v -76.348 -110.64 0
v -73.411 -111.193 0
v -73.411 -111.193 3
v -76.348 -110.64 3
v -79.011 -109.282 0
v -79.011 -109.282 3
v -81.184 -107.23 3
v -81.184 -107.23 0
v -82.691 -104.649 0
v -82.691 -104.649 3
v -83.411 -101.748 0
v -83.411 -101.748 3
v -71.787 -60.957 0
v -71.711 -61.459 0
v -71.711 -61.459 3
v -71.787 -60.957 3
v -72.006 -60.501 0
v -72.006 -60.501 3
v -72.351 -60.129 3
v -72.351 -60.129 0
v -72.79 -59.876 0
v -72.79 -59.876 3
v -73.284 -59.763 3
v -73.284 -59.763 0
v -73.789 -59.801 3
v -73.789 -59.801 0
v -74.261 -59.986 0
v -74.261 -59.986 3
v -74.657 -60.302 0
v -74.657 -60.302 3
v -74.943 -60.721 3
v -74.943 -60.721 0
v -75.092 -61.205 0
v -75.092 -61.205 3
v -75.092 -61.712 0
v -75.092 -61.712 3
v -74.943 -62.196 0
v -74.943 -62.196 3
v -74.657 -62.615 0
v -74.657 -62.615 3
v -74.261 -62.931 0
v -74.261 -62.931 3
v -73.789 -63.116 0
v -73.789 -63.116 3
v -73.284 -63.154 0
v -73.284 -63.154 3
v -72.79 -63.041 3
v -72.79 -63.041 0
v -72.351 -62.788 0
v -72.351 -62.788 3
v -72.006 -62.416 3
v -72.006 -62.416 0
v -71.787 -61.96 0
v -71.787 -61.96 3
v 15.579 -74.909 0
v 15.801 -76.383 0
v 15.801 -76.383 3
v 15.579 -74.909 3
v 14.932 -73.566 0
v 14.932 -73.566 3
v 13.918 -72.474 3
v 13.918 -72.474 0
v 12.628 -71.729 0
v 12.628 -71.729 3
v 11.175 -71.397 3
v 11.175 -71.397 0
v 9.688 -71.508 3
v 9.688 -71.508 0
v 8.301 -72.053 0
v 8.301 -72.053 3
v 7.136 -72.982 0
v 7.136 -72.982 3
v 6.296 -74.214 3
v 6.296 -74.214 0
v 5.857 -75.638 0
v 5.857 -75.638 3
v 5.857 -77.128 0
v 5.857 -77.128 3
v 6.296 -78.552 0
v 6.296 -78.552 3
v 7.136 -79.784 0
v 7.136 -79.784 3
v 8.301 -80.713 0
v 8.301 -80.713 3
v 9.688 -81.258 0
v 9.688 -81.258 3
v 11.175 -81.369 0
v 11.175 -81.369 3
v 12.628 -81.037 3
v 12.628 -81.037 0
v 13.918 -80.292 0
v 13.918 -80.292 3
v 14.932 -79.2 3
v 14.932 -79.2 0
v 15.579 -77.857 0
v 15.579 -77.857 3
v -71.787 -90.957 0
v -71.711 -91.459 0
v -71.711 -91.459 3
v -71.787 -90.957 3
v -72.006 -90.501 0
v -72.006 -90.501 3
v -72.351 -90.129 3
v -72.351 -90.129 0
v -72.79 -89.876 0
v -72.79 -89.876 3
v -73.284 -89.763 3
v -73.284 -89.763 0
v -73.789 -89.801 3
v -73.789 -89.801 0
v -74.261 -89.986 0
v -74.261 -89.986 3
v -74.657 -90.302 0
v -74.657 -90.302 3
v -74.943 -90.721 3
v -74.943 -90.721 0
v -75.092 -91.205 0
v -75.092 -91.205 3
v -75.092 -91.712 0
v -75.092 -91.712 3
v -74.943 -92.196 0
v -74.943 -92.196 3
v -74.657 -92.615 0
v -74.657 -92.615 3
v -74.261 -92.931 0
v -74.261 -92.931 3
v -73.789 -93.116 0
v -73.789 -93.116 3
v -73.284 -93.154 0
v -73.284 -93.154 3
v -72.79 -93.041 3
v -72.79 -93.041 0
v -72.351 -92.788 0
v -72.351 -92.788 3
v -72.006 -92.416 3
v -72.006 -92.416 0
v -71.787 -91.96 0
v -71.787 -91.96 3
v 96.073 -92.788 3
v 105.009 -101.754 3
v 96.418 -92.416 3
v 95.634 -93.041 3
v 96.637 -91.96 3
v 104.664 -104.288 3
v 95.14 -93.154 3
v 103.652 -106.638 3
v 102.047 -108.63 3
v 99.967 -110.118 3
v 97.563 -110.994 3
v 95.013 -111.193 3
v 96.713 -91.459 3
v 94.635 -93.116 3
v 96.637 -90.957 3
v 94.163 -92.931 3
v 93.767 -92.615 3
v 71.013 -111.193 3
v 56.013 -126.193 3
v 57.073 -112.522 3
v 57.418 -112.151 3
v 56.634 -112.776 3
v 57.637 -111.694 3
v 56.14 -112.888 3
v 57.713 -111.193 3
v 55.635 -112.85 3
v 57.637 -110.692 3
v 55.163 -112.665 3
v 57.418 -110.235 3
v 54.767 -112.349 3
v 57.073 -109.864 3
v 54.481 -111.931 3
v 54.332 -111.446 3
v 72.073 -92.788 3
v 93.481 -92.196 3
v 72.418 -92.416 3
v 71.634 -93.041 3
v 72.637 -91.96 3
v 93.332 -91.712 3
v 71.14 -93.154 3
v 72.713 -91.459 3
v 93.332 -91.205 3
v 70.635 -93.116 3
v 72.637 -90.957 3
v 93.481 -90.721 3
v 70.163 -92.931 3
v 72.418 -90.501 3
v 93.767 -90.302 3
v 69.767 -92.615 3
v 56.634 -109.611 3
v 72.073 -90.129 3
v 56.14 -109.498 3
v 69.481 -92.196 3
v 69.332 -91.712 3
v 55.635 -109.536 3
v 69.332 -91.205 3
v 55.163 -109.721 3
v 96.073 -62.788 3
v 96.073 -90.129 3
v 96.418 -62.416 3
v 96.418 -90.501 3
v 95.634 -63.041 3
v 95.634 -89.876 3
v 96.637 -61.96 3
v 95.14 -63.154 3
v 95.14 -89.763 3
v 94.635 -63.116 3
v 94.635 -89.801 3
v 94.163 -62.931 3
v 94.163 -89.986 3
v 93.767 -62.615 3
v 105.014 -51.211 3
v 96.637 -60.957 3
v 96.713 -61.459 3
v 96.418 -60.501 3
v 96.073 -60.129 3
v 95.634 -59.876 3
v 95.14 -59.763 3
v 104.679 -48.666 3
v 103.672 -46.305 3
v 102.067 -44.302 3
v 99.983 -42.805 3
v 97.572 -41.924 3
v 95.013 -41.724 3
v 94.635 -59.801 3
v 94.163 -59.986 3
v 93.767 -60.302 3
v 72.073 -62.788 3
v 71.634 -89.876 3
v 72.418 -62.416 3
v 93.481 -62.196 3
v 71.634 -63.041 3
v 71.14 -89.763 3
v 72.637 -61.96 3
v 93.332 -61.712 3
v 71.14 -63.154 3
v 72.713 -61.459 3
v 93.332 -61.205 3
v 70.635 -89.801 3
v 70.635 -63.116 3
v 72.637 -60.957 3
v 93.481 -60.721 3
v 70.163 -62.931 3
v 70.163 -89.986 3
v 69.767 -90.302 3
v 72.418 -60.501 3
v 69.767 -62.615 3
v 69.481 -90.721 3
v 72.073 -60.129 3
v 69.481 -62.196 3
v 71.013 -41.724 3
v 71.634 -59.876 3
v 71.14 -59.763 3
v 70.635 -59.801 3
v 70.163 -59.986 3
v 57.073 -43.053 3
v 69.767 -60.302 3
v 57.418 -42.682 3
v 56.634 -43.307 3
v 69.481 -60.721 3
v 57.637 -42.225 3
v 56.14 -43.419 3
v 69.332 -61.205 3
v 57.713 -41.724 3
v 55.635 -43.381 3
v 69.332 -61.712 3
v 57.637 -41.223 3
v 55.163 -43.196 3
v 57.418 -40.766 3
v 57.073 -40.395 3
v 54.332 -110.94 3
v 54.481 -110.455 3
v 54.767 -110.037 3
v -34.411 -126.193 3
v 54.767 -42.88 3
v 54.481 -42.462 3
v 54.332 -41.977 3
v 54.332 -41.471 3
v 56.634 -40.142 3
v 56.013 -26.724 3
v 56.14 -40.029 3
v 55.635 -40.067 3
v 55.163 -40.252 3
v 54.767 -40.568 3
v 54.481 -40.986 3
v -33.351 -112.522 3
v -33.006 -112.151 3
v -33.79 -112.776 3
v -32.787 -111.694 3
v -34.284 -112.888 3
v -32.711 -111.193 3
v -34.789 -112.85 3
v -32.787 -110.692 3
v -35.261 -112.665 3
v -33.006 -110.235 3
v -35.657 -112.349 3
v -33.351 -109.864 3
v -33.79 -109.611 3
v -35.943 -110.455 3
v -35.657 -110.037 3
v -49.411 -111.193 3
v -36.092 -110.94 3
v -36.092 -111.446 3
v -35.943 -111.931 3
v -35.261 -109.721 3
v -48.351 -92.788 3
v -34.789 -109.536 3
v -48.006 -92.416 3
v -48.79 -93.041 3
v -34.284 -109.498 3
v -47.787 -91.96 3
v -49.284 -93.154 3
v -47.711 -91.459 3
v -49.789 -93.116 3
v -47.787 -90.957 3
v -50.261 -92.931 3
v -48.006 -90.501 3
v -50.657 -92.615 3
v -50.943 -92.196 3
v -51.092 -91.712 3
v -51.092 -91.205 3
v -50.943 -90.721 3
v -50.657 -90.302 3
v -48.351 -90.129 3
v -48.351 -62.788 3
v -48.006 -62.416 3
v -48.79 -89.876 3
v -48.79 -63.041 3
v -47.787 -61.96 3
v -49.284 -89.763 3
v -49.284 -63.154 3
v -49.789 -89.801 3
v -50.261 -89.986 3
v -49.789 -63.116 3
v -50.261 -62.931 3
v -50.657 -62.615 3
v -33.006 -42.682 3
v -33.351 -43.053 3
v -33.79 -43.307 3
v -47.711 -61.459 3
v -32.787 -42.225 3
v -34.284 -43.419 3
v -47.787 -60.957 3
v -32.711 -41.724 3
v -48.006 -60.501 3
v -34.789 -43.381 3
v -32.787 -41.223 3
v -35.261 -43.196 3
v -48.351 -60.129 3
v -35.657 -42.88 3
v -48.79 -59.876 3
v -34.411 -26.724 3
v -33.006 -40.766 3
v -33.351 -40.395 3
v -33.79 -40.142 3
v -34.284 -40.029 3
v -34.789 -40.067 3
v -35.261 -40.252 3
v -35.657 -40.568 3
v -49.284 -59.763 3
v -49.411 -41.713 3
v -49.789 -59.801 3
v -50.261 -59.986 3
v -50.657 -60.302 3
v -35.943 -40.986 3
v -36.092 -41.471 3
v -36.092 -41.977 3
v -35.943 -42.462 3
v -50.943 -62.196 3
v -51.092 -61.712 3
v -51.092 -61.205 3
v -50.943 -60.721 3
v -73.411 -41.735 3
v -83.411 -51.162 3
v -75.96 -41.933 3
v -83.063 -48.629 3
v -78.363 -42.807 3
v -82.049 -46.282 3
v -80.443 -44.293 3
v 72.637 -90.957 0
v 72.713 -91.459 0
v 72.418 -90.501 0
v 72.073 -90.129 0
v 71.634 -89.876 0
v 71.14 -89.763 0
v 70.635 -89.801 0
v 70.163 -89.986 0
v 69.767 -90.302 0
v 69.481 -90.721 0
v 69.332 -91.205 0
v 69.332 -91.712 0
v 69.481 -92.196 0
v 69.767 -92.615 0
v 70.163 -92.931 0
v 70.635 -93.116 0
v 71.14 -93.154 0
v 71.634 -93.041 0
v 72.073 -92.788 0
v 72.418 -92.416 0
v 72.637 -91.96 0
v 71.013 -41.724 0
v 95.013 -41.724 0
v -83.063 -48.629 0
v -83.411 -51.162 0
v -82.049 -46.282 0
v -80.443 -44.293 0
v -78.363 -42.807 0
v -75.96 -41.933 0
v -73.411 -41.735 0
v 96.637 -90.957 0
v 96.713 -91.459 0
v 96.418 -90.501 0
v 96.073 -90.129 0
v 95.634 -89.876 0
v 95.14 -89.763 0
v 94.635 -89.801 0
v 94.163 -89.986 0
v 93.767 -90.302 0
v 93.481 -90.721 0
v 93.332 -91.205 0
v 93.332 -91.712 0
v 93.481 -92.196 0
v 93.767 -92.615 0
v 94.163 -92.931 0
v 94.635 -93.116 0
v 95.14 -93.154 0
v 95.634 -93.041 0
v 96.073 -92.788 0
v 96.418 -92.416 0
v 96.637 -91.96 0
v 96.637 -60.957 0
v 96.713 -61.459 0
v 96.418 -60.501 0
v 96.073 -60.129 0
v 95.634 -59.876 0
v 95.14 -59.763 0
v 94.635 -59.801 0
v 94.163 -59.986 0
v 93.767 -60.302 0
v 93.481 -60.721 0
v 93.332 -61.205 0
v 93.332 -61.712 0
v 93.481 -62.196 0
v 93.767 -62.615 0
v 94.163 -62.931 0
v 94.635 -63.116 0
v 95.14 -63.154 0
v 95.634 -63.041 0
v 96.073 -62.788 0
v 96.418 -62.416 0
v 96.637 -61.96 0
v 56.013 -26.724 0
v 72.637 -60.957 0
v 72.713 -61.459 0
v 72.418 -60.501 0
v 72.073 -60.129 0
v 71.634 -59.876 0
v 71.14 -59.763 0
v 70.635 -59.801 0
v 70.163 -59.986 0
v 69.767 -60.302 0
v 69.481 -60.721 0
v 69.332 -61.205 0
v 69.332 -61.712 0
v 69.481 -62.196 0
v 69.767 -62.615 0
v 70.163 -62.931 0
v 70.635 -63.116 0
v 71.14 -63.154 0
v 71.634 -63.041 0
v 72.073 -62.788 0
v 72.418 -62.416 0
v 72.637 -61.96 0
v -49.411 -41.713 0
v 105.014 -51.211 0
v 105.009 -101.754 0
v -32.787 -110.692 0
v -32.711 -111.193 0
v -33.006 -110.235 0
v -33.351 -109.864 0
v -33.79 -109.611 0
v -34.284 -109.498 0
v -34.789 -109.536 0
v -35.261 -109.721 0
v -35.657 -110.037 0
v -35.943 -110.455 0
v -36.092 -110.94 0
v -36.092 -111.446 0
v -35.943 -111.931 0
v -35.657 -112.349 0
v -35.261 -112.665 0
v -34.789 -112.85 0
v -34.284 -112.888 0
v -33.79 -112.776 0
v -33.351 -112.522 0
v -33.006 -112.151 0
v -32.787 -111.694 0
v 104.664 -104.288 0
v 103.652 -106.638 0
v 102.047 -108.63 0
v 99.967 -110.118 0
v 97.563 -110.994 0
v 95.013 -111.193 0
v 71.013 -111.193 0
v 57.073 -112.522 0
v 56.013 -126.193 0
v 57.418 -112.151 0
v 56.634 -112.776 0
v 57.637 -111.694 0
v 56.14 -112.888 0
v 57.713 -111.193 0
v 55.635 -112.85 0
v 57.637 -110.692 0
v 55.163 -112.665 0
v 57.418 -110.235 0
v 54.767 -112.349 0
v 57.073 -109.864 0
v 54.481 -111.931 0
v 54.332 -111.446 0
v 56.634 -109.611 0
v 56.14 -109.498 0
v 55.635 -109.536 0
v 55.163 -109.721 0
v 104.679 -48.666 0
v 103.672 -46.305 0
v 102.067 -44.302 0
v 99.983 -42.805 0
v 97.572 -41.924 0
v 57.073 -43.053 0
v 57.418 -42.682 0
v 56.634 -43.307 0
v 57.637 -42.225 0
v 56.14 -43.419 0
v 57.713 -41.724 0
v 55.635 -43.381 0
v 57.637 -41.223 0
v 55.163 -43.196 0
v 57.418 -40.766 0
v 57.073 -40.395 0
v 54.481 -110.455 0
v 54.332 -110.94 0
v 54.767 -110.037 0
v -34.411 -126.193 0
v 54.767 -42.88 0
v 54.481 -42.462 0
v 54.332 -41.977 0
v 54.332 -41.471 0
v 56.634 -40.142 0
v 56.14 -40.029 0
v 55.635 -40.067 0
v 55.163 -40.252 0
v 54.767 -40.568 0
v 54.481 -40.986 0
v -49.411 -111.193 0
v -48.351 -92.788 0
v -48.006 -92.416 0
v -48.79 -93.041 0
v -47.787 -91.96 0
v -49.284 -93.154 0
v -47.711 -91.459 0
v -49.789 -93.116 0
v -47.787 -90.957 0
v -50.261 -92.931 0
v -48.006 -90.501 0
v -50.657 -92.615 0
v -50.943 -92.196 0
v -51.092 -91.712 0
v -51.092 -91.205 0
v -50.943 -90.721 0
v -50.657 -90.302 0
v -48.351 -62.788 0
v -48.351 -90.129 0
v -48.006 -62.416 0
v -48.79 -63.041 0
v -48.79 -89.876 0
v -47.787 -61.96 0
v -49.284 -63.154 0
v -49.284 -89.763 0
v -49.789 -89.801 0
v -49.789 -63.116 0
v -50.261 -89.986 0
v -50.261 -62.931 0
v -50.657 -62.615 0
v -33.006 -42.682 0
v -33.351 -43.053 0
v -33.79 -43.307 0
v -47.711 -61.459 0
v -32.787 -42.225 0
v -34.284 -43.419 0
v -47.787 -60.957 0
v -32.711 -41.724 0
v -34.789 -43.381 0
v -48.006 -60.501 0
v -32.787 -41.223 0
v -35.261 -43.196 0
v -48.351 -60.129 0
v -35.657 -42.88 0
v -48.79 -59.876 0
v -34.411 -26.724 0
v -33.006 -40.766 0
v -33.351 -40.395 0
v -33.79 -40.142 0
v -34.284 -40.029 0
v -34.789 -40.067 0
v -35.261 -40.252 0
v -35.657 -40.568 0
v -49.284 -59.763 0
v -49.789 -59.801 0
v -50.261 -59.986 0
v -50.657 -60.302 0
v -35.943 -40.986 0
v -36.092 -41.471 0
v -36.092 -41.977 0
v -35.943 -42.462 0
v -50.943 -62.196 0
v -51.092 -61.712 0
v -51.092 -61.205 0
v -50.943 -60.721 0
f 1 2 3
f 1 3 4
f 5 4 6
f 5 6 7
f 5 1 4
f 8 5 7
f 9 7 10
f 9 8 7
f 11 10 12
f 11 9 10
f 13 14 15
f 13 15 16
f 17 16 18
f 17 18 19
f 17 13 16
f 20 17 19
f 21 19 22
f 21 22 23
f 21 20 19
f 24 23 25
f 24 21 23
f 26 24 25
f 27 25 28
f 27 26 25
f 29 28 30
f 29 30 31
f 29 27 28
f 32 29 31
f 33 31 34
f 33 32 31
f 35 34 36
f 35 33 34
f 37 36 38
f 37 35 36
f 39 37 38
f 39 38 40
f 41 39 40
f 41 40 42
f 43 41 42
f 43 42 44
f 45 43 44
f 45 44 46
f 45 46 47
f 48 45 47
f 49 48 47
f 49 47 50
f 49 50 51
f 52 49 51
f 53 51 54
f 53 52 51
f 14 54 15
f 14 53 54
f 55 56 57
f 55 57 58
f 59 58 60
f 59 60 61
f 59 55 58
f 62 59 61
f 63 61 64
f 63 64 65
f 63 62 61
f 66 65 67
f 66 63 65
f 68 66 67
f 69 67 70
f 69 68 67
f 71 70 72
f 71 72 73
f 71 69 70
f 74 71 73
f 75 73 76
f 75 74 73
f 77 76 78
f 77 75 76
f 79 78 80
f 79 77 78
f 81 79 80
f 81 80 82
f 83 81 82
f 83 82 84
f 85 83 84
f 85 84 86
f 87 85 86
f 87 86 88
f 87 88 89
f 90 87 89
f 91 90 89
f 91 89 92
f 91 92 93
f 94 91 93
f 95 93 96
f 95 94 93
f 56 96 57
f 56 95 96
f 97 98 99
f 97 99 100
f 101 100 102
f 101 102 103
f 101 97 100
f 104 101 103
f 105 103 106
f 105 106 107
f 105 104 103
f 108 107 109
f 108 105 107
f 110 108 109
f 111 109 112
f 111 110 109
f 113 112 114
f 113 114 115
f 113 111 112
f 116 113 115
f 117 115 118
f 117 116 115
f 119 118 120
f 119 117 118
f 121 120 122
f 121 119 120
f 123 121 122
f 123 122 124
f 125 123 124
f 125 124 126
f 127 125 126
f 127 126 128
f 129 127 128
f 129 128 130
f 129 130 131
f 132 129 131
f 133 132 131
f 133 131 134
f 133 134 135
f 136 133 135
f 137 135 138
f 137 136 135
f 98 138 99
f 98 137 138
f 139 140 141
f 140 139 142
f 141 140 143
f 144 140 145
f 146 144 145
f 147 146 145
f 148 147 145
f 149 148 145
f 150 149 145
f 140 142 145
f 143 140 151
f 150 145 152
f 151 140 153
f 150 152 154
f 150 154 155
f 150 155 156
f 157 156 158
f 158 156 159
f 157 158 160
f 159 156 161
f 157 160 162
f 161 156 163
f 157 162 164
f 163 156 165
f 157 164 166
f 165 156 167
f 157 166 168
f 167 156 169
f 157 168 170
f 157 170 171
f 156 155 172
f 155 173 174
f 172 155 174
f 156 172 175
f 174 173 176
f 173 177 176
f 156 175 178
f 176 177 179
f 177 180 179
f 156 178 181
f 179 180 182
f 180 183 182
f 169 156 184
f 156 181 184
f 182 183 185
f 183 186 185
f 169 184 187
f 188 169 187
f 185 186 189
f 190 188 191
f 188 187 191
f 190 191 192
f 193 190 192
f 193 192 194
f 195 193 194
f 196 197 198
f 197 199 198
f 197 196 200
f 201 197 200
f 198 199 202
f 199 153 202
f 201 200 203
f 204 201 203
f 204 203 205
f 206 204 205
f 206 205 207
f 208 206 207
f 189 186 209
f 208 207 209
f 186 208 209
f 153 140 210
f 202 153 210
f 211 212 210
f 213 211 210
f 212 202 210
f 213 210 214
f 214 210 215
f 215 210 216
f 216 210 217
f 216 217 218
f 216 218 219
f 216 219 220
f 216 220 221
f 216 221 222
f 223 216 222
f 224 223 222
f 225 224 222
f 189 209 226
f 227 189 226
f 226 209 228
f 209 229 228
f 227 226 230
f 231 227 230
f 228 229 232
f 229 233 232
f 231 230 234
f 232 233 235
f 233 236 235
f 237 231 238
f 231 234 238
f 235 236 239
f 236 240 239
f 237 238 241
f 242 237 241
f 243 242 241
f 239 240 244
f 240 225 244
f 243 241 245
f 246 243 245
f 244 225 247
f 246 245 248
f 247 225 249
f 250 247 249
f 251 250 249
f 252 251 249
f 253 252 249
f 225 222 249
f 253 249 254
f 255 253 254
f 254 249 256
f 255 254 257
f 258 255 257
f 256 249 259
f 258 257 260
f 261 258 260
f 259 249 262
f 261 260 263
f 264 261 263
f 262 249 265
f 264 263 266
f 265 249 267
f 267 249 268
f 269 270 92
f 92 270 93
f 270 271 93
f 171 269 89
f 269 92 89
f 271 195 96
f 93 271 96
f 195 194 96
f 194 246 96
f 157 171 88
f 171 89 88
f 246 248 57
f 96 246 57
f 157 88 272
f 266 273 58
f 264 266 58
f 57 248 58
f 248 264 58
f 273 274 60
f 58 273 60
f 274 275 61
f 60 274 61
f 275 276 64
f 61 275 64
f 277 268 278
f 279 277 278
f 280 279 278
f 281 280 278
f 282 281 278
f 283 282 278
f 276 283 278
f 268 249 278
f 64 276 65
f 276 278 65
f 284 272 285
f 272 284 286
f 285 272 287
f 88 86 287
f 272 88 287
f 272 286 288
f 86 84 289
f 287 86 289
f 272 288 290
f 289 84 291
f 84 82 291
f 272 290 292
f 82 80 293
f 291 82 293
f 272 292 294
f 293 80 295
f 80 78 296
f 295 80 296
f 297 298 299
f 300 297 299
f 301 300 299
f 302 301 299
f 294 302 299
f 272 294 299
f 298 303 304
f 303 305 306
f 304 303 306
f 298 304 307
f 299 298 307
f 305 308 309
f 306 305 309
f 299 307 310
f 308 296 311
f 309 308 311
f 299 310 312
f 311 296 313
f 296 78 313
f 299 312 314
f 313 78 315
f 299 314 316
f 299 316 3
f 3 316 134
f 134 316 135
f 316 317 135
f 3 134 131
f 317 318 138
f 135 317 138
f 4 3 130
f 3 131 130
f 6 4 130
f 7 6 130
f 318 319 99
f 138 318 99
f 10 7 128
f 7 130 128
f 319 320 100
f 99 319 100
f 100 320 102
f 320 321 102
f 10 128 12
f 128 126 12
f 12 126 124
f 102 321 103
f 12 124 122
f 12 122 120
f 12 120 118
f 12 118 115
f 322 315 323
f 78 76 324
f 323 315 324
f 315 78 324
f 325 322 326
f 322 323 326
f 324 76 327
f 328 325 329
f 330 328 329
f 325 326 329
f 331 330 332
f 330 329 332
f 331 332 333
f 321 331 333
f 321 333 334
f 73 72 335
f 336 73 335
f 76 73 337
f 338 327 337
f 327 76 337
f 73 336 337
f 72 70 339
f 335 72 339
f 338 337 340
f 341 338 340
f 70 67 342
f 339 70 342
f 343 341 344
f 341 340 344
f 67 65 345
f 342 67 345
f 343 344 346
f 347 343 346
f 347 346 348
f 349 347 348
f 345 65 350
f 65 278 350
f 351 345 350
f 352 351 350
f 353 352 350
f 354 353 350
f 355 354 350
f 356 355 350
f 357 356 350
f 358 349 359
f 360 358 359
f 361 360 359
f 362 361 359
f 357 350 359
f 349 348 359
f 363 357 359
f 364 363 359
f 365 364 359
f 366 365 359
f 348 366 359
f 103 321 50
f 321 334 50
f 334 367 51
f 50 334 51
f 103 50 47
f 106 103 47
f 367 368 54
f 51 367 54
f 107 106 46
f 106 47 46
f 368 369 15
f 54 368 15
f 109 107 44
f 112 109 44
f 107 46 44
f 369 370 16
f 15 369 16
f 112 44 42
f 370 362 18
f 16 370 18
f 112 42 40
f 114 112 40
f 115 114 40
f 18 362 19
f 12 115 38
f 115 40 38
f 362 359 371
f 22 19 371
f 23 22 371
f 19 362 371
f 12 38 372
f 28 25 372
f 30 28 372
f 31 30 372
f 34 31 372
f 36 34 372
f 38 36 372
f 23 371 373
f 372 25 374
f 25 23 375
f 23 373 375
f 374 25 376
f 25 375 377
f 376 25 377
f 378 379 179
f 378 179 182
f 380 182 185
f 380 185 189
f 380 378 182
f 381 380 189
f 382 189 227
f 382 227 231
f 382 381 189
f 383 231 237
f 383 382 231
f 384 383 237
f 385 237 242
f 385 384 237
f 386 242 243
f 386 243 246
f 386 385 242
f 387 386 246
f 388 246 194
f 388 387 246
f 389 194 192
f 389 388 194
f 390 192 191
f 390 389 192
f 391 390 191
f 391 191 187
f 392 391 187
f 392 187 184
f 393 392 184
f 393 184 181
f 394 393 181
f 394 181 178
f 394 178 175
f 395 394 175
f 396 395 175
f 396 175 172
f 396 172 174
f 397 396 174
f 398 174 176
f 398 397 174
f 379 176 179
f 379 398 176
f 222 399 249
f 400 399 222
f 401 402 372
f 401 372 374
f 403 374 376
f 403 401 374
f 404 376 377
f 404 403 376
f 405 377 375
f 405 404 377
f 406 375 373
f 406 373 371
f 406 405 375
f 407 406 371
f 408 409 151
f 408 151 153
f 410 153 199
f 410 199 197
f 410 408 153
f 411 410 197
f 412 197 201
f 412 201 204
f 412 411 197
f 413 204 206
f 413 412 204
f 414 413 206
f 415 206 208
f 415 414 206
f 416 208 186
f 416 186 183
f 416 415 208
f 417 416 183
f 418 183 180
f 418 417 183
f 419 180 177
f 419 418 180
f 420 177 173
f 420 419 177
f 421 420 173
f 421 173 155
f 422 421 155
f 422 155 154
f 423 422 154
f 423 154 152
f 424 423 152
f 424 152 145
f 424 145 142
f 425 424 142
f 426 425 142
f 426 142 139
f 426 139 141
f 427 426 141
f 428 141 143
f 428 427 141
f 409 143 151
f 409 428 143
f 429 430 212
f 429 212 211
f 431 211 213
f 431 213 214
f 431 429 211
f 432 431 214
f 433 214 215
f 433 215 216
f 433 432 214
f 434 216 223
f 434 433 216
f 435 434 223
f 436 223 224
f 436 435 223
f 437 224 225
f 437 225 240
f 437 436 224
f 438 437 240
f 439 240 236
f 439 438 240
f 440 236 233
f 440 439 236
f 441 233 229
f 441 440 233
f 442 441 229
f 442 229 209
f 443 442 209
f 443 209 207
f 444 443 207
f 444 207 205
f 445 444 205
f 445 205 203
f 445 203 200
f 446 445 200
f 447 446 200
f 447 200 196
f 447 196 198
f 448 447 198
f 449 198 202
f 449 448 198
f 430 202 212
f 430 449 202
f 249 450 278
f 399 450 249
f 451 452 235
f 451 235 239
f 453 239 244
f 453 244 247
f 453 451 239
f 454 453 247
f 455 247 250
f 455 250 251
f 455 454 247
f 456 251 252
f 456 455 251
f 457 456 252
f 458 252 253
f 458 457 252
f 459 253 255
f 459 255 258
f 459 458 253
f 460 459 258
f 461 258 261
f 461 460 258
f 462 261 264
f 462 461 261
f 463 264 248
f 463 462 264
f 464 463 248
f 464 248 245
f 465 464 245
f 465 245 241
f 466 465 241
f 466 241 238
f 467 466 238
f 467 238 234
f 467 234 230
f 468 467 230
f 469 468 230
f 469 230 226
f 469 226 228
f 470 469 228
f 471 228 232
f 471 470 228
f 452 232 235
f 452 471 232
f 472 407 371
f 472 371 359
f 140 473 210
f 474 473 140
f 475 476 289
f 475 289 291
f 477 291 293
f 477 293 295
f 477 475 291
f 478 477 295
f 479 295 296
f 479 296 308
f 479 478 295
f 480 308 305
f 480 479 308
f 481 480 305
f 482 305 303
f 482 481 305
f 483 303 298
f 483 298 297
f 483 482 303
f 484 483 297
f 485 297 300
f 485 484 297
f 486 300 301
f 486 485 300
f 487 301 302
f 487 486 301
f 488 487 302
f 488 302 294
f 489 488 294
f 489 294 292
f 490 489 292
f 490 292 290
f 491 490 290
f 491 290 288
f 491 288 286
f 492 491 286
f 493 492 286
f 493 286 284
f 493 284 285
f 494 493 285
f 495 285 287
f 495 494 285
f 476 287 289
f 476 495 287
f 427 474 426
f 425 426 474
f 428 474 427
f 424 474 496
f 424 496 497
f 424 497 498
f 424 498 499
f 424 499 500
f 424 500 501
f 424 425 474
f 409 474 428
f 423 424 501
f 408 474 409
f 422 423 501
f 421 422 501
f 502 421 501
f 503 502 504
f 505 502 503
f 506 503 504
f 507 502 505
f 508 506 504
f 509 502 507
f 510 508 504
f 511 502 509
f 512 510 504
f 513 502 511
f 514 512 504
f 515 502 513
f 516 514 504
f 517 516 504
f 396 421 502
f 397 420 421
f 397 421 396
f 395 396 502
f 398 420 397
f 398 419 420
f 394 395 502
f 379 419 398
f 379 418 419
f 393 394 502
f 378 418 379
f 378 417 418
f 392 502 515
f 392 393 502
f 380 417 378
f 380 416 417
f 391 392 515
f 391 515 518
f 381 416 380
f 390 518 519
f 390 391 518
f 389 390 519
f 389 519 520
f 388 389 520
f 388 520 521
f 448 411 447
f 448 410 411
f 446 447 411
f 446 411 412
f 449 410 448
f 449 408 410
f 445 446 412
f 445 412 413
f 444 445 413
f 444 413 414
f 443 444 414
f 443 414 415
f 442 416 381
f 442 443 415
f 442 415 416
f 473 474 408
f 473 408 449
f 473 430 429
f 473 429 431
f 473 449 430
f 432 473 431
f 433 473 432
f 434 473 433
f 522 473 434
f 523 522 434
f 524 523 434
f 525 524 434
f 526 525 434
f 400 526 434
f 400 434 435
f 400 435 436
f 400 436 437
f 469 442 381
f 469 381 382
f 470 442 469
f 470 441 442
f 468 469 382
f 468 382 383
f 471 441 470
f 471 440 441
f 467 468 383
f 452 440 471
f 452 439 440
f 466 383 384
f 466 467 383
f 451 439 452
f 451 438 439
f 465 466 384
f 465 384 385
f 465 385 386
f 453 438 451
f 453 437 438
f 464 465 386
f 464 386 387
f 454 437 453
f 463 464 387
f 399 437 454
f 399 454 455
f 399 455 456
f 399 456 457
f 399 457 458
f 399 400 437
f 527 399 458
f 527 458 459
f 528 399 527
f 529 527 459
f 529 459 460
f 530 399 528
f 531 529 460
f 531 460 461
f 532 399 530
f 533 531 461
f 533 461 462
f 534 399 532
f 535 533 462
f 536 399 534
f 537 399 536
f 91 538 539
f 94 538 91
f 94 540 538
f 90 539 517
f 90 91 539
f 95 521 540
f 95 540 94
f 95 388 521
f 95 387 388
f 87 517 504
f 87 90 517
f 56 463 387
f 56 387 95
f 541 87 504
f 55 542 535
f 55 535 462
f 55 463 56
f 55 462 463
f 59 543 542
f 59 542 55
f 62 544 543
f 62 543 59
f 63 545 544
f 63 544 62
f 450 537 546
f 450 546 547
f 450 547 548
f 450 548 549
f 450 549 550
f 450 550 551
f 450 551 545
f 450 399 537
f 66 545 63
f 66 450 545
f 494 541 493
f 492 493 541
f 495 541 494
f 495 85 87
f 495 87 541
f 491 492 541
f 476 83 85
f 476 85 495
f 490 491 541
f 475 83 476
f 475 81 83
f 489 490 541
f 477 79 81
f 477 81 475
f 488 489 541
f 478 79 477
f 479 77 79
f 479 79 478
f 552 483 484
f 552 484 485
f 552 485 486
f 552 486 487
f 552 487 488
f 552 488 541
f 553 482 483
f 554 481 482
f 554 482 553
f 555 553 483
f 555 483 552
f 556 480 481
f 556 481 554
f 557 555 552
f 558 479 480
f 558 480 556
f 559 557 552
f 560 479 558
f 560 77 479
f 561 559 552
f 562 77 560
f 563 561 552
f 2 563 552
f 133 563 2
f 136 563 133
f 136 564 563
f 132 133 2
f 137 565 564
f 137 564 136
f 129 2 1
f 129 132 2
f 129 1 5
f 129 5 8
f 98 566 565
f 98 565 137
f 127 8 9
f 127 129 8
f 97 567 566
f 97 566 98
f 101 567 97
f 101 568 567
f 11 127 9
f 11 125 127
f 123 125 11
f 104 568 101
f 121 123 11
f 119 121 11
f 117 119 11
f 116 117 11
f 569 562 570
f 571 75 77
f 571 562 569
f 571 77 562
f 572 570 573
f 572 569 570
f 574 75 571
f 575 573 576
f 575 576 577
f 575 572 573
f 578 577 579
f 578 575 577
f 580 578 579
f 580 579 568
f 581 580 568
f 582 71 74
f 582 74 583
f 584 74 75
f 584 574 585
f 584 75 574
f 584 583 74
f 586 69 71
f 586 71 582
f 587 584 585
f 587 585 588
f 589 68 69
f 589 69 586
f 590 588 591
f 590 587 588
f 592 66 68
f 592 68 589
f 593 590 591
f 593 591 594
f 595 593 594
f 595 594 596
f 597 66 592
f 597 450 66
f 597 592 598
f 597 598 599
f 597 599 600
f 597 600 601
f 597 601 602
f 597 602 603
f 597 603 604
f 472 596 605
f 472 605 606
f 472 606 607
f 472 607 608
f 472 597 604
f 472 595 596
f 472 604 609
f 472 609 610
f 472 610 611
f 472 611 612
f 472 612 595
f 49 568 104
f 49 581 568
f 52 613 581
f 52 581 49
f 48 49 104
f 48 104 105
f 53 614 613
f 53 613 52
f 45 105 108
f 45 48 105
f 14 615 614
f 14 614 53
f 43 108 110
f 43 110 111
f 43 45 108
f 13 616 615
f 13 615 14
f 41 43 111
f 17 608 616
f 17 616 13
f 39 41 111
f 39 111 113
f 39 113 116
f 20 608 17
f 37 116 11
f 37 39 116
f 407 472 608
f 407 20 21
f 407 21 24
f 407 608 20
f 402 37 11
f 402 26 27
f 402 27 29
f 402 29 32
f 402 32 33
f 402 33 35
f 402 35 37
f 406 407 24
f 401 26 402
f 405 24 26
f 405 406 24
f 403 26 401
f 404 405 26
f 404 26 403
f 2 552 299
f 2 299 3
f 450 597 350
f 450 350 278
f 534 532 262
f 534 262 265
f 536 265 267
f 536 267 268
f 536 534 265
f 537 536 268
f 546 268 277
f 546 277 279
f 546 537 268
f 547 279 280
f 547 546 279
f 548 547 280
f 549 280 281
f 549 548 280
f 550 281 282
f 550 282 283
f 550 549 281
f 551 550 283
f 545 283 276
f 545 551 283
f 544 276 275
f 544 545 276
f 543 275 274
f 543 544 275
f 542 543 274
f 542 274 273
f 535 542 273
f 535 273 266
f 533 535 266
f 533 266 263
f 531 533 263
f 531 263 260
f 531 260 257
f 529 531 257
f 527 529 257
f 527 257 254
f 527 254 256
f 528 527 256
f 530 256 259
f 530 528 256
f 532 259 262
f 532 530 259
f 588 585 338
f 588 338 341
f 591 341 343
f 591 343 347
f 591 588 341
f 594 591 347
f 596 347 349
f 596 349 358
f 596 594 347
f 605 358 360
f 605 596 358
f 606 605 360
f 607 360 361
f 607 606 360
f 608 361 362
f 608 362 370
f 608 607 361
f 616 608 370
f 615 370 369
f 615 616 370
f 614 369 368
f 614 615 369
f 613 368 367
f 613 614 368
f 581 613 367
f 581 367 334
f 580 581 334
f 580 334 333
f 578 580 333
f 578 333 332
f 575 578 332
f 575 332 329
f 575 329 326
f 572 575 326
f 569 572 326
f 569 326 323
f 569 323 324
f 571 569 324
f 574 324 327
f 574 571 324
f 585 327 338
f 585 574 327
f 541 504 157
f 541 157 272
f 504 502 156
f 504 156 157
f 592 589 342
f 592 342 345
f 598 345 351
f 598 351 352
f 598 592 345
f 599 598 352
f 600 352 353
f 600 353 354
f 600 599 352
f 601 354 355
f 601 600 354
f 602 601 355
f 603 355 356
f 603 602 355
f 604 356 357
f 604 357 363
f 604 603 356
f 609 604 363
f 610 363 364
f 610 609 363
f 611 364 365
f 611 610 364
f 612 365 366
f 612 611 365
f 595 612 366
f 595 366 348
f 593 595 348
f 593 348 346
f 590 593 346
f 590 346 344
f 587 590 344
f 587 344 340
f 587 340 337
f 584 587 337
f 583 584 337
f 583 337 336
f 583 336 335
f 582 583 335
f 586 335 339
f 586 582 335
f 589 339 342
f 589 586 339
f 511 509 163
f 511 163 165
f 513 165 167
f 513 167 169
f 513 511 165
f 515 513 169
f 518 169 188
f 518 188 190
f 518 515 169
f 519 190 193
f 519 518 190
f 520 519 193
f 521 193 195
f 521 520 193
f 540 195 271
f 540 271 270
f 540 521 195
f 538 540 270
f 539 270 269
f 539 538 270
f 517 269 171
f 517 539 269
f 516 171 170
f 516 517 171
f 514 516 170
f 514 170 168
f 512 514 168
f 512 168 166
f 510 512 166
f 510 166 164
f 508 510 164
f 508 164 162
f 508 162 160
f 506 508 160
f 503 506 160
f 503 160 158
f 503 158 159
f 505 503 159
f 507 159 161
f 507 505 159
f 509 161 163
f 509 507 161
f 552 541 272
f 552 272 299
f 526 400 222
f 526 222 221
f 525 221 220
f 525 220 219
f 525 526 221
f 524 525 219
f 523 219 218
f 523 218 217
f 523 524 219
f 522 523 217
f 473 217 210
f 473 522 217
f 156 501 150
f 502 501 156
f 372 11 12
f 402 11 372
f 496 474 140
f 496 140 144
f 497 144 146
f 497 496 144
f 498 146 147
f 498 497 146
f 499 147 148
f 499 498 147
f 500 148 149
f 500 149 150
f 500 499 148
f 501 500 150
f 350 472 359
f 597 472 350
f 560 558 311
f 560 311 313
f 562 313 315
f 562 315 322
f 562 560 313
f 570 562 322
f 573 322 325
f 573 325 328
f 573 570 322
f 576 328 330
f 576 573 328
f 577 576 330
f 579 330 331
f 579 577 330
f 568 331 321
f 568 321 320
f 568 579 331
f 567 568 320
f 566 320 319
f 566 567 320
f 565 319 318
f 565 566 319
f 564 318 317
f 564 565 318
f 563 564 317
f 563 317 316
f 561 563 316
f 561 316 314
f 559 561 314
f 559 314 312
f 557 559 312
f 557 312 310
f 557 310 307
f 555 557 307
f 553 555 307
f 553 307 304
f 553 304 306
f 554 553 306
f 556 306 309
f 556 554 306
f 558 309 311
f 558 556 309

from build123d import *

# Parameters (mm, degrees)
SKETCH2_R           = 1.7
SKETCH2_R_2         = 5
BOSS_EXTRUDE4_DEPTH = 3


with BuildPart() as part:
    # Sketch2 → Boss-Extrude4 (new body)
    with BuildSketch(Plane.XY):
        with BuildLine():
            Line((-49.411099801, -41.712890537), (-34.411099801, -26.724072871))
            Line((-34.411099801, -26.724072871), (56.012900199, -26.724072871))
            Line((56.012900199, -26.724072871), (71.012900199, -41.724072871))
            Line((71.012900199, -41.724072871), (95.012900199, -41.724072871))
            ThreePointArc((95.012900199, -41.724072871), (102.06743807, -44.301892558), (105.013826091, -51.210615779))
            Line((105.013826091, -51.210615779), (105.009259778, -101.753736116))
            ThreePointArc((105.009259778, -101.753736116), (102.047198601, -108.629676096), (95.012900199, -111.193072871))
            Line((95.012900199, -111.193072871), (71.012900199, -111.193072871))
            Line((71.012900199, -111.193072871), (56.012900199, -126.193072871))
            Line((56.012900199, -126.193072871), (-34.411099801, -126.193072871))
            Line((-34.411099801, -126.193072871), (-49.411099801, -111.193072871))
            Line((-49.411099801, -111.193072871), (-73.411099801, -111.193072871))
            ThreePointArc((-73.411099801, -111.193072871), (-80.170723963, -108.333415965), (-83.411099801, -101.747816457))
            Line((-83.411099801, -101.747816457), (-83.411099801, -51.162112892))
            ThreePointArc((-83.411099801, -51.162112892), (-80.443251923, -44.29297937), (-73.411099801, -41.735255206))
            Line((-73.411099801, -41.735255206), (-49.411099801, -41.712890537))
        make_face()
        with Locations((-49.411099801, -61.458572871)):
            Circle(SKETCH2_R, mode=Mode.SUBTRACT)
        with Locations((-73.411099801, -61.458572871)):
            Circle(SKETCH2_R, mode=Mode.SUBTRACT)
        with Locations((-73.411099801, -91.458572871)):
            Circle(SKETCH2_R, mode=Mode.SUBTRACT)
        with Locations((-49.411099801, -91.458572871)):
            Circle(SKETCH2_R, mode=Mode.SUBTRACT)
        with Locations((95.012900199, -91.458572871)):
            Circle(SKETCH2_R, mode=Mode.SUBTRACT)
        with Locations((71.012900199, -91.458572871)):
            Circle(SKETCH2_R, mode=Mode.SUBTRACT)
        with Locations((95.012900199, -61.458572871)):
            Circle(SKETCH2_R, mode=Mode.SUBTRACT)
        with Locations((71.012900199, -61.458572871)):
            Circle(SKETCH2_R, mode=Mode.SUBTRACT)
        with Locations((10.800900199, -76.383042082)):
            Circle(SKETCH2_R_2, mode=Mode.SUBTRACT)
        with Locations((-34.411099801, -41.724072871)):
            Circle(SKETCH2_R, mode=Mode.SUBTRACT)
        with Locations((-34.411099801, -111.193072871)):
            Circle(SKETCH2_R, mode=Mode.SUBTRACT)
        with Locations((56.012900199, -111.193072871)):
            Circle(SKETCH2_R, mode=Mode.SUBTRACT)
        with Locations((56.012900199, -41.724072871)):
            Circle(SKETCH2_R, mode=Mode.SUBTRACT)
    extrude(amount=BOSS_EXTRUDE4_DEPTH)


solid = part.part
